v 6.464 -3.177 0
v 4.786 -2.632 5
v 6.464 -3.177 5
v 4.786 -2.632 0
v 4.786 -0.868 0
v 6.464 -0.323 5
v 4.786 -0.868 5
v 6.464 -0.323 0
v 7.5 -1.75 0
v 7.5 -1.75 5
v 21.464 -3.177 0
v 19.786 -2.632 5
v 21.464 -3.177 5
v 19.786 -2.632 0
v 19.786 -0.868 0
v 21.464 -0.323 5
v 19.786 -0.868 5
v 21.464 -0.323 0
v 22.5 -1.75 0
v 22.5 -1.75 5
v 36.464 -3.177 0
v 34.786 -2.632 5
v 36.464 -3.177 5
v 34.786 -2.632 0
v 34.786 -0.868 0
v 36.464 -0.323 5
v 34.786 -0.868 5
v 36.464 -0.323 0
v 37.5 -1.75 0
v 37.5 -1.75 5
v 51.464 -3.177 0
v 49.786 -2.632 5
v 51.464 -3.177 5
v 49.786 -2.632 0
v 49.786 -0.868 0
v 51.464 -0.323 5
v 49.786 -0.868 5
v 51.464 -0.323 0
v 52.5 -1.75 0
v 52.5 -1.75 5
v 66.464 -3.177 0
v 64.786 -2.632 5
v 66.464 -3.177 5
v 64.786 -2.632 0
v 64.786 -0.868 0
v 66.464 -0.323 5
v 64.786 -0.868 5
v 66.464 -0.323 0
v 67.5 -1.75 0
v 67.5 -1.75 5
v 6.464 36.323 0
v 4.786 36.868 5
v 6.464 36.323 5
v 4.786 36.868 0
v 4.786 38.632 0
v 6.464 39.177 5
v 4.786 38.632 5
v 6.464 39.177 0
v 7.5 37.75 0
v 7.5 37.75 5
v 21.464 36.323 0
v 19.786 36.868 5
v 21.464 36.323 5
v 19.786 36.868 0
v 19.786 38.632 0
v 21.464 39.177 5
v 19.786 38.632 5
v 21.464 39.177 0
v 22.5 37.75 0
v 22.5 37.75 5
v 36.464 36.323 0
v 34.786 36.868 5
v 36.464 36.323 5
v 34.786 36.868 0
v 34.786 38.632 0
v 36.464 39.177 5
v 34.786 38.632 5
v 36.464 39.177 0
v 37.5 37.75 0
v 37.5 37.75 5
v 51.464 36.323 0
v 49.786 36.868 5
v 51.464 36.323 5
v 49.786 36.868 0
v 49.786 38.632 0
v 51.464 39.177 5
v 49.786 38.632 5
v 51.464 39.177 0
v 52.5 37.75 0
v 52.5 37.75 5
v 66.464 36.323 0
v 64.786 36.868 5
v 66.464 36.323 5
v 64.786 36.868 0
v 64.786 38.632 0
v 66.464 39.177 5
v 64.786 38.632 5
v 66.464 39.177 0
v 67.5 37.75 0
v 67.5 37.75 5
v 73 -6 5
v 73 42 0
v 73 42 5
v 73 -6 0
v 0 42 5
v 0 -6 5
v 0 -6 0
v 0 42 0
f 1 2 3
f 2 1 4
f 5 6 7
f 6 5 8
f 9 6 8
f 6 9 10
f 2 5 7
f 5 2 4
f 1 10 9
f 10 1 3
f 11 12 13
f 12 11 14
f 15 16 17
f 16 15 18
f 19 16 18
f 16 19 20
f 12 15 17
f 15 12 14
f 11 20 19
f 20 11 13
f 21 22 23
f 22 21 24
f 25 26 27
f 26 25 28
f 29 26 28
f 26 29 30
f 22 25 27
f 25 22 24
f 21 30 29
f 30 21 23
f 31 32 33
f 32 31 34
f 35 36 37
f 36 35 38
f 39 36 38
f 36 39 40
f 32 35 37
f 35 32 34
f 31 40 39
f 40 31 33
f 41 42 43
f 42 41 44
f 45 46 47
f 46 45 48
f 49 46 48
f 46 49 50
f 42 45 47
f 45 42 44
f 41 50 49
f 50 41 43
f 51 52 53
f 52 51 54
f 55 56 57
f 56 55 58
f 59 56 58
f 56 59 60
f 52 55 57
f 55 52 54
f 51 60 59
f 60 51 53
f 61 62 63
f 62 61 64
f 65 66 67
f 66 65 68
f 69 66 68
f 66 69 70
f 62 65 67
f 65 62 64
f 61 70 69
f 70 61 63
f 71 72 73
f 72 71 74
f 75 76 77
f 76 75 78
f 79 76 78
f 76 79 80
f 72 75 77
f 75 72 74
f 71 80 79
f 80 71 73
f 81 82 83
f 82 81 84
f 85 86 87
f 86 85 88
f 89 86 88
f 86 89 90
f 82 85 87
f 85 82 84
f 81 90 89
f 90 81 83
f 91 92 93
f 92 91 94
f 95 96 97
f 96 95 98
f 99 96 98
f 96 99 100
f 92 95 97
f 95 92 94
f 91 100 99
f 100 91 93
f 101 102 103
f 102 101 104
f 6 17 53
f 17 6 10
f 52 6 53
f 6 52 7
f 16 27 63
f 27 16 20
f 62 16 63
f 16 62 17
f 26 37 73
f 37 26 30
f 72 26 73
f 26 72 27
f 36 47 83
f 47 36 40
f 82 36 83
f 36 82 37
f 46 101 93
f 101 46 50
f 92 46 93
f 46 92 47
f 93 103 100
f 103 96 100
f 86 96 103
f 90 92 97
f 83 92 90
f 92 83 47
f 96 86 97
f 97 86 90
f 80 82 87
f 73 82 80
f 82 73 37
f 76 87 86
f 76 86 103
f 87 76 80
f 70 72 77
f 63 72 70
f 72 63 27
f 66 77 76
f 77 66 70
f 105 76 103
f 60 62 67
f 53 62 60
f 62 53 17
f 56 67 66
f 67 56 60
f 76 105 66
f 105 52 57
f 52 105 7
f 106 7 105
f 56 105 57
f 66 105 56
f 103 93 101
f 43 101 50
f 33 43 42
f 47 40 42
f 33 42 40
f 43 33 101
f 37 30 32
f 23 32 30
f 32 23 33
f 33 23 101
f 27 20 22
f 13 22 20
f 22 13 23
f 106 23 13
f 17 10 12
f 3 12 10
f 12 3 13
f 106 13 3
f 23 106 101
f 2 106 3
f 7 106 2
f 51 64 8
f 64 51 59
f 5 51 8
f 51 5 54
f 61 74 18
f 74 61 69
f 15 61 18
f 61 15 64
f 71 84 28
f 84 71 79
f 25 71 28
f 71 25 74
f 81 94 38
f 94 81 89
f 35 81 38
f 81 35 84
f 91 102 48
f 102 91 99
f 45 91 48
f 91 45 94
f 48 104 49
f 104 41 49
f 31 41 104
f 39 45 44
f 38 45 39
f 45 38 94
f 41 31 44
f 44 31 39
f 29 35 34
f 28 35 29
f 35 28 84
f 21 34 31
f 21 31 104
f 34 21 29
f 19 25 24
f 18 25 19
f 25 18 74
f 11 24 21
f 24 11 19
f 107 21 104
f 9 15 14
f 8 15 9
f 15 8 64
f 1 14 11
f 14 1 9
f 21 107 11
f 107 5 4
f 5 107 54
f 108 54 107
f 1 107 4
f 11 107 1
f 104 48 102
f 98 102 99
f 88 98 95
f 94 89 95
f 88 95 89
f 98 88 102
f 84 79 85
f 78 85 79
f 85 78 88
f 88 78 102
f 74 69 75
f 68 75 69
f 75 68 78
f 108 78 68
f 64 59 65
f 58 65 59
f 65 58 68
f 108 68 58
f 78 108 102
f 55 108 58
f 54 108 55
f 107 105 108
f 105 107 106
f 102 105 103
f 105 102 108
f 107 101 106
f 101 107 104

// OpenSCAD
pcbDim=[73, 36, 0.6];
screwR = 1.75;
nscrew = 5;
dscrew = 15;
extra = 6;

module body(){
translate([0,-extra,0]) cube([pcbDim[0], pcbDim[1]+2*extra, 5]);
}


module screwHoles(n, d, r, l){
    for(i = [0:1:n-1]){
        translate([i*d,0,0])
        cylinder(l, r, r);
    }
}

module screws(){
translate([6,0,-1]){
    translate([0,-screwR,0]) screwHoles(nscrew,dscrew,1.5,12);
    translate([0,pcbDim[1]+screwR,0]) screwHoles(nscrew,dscrew,1.5,12);
}
}

difference(){ body(); screws();};
